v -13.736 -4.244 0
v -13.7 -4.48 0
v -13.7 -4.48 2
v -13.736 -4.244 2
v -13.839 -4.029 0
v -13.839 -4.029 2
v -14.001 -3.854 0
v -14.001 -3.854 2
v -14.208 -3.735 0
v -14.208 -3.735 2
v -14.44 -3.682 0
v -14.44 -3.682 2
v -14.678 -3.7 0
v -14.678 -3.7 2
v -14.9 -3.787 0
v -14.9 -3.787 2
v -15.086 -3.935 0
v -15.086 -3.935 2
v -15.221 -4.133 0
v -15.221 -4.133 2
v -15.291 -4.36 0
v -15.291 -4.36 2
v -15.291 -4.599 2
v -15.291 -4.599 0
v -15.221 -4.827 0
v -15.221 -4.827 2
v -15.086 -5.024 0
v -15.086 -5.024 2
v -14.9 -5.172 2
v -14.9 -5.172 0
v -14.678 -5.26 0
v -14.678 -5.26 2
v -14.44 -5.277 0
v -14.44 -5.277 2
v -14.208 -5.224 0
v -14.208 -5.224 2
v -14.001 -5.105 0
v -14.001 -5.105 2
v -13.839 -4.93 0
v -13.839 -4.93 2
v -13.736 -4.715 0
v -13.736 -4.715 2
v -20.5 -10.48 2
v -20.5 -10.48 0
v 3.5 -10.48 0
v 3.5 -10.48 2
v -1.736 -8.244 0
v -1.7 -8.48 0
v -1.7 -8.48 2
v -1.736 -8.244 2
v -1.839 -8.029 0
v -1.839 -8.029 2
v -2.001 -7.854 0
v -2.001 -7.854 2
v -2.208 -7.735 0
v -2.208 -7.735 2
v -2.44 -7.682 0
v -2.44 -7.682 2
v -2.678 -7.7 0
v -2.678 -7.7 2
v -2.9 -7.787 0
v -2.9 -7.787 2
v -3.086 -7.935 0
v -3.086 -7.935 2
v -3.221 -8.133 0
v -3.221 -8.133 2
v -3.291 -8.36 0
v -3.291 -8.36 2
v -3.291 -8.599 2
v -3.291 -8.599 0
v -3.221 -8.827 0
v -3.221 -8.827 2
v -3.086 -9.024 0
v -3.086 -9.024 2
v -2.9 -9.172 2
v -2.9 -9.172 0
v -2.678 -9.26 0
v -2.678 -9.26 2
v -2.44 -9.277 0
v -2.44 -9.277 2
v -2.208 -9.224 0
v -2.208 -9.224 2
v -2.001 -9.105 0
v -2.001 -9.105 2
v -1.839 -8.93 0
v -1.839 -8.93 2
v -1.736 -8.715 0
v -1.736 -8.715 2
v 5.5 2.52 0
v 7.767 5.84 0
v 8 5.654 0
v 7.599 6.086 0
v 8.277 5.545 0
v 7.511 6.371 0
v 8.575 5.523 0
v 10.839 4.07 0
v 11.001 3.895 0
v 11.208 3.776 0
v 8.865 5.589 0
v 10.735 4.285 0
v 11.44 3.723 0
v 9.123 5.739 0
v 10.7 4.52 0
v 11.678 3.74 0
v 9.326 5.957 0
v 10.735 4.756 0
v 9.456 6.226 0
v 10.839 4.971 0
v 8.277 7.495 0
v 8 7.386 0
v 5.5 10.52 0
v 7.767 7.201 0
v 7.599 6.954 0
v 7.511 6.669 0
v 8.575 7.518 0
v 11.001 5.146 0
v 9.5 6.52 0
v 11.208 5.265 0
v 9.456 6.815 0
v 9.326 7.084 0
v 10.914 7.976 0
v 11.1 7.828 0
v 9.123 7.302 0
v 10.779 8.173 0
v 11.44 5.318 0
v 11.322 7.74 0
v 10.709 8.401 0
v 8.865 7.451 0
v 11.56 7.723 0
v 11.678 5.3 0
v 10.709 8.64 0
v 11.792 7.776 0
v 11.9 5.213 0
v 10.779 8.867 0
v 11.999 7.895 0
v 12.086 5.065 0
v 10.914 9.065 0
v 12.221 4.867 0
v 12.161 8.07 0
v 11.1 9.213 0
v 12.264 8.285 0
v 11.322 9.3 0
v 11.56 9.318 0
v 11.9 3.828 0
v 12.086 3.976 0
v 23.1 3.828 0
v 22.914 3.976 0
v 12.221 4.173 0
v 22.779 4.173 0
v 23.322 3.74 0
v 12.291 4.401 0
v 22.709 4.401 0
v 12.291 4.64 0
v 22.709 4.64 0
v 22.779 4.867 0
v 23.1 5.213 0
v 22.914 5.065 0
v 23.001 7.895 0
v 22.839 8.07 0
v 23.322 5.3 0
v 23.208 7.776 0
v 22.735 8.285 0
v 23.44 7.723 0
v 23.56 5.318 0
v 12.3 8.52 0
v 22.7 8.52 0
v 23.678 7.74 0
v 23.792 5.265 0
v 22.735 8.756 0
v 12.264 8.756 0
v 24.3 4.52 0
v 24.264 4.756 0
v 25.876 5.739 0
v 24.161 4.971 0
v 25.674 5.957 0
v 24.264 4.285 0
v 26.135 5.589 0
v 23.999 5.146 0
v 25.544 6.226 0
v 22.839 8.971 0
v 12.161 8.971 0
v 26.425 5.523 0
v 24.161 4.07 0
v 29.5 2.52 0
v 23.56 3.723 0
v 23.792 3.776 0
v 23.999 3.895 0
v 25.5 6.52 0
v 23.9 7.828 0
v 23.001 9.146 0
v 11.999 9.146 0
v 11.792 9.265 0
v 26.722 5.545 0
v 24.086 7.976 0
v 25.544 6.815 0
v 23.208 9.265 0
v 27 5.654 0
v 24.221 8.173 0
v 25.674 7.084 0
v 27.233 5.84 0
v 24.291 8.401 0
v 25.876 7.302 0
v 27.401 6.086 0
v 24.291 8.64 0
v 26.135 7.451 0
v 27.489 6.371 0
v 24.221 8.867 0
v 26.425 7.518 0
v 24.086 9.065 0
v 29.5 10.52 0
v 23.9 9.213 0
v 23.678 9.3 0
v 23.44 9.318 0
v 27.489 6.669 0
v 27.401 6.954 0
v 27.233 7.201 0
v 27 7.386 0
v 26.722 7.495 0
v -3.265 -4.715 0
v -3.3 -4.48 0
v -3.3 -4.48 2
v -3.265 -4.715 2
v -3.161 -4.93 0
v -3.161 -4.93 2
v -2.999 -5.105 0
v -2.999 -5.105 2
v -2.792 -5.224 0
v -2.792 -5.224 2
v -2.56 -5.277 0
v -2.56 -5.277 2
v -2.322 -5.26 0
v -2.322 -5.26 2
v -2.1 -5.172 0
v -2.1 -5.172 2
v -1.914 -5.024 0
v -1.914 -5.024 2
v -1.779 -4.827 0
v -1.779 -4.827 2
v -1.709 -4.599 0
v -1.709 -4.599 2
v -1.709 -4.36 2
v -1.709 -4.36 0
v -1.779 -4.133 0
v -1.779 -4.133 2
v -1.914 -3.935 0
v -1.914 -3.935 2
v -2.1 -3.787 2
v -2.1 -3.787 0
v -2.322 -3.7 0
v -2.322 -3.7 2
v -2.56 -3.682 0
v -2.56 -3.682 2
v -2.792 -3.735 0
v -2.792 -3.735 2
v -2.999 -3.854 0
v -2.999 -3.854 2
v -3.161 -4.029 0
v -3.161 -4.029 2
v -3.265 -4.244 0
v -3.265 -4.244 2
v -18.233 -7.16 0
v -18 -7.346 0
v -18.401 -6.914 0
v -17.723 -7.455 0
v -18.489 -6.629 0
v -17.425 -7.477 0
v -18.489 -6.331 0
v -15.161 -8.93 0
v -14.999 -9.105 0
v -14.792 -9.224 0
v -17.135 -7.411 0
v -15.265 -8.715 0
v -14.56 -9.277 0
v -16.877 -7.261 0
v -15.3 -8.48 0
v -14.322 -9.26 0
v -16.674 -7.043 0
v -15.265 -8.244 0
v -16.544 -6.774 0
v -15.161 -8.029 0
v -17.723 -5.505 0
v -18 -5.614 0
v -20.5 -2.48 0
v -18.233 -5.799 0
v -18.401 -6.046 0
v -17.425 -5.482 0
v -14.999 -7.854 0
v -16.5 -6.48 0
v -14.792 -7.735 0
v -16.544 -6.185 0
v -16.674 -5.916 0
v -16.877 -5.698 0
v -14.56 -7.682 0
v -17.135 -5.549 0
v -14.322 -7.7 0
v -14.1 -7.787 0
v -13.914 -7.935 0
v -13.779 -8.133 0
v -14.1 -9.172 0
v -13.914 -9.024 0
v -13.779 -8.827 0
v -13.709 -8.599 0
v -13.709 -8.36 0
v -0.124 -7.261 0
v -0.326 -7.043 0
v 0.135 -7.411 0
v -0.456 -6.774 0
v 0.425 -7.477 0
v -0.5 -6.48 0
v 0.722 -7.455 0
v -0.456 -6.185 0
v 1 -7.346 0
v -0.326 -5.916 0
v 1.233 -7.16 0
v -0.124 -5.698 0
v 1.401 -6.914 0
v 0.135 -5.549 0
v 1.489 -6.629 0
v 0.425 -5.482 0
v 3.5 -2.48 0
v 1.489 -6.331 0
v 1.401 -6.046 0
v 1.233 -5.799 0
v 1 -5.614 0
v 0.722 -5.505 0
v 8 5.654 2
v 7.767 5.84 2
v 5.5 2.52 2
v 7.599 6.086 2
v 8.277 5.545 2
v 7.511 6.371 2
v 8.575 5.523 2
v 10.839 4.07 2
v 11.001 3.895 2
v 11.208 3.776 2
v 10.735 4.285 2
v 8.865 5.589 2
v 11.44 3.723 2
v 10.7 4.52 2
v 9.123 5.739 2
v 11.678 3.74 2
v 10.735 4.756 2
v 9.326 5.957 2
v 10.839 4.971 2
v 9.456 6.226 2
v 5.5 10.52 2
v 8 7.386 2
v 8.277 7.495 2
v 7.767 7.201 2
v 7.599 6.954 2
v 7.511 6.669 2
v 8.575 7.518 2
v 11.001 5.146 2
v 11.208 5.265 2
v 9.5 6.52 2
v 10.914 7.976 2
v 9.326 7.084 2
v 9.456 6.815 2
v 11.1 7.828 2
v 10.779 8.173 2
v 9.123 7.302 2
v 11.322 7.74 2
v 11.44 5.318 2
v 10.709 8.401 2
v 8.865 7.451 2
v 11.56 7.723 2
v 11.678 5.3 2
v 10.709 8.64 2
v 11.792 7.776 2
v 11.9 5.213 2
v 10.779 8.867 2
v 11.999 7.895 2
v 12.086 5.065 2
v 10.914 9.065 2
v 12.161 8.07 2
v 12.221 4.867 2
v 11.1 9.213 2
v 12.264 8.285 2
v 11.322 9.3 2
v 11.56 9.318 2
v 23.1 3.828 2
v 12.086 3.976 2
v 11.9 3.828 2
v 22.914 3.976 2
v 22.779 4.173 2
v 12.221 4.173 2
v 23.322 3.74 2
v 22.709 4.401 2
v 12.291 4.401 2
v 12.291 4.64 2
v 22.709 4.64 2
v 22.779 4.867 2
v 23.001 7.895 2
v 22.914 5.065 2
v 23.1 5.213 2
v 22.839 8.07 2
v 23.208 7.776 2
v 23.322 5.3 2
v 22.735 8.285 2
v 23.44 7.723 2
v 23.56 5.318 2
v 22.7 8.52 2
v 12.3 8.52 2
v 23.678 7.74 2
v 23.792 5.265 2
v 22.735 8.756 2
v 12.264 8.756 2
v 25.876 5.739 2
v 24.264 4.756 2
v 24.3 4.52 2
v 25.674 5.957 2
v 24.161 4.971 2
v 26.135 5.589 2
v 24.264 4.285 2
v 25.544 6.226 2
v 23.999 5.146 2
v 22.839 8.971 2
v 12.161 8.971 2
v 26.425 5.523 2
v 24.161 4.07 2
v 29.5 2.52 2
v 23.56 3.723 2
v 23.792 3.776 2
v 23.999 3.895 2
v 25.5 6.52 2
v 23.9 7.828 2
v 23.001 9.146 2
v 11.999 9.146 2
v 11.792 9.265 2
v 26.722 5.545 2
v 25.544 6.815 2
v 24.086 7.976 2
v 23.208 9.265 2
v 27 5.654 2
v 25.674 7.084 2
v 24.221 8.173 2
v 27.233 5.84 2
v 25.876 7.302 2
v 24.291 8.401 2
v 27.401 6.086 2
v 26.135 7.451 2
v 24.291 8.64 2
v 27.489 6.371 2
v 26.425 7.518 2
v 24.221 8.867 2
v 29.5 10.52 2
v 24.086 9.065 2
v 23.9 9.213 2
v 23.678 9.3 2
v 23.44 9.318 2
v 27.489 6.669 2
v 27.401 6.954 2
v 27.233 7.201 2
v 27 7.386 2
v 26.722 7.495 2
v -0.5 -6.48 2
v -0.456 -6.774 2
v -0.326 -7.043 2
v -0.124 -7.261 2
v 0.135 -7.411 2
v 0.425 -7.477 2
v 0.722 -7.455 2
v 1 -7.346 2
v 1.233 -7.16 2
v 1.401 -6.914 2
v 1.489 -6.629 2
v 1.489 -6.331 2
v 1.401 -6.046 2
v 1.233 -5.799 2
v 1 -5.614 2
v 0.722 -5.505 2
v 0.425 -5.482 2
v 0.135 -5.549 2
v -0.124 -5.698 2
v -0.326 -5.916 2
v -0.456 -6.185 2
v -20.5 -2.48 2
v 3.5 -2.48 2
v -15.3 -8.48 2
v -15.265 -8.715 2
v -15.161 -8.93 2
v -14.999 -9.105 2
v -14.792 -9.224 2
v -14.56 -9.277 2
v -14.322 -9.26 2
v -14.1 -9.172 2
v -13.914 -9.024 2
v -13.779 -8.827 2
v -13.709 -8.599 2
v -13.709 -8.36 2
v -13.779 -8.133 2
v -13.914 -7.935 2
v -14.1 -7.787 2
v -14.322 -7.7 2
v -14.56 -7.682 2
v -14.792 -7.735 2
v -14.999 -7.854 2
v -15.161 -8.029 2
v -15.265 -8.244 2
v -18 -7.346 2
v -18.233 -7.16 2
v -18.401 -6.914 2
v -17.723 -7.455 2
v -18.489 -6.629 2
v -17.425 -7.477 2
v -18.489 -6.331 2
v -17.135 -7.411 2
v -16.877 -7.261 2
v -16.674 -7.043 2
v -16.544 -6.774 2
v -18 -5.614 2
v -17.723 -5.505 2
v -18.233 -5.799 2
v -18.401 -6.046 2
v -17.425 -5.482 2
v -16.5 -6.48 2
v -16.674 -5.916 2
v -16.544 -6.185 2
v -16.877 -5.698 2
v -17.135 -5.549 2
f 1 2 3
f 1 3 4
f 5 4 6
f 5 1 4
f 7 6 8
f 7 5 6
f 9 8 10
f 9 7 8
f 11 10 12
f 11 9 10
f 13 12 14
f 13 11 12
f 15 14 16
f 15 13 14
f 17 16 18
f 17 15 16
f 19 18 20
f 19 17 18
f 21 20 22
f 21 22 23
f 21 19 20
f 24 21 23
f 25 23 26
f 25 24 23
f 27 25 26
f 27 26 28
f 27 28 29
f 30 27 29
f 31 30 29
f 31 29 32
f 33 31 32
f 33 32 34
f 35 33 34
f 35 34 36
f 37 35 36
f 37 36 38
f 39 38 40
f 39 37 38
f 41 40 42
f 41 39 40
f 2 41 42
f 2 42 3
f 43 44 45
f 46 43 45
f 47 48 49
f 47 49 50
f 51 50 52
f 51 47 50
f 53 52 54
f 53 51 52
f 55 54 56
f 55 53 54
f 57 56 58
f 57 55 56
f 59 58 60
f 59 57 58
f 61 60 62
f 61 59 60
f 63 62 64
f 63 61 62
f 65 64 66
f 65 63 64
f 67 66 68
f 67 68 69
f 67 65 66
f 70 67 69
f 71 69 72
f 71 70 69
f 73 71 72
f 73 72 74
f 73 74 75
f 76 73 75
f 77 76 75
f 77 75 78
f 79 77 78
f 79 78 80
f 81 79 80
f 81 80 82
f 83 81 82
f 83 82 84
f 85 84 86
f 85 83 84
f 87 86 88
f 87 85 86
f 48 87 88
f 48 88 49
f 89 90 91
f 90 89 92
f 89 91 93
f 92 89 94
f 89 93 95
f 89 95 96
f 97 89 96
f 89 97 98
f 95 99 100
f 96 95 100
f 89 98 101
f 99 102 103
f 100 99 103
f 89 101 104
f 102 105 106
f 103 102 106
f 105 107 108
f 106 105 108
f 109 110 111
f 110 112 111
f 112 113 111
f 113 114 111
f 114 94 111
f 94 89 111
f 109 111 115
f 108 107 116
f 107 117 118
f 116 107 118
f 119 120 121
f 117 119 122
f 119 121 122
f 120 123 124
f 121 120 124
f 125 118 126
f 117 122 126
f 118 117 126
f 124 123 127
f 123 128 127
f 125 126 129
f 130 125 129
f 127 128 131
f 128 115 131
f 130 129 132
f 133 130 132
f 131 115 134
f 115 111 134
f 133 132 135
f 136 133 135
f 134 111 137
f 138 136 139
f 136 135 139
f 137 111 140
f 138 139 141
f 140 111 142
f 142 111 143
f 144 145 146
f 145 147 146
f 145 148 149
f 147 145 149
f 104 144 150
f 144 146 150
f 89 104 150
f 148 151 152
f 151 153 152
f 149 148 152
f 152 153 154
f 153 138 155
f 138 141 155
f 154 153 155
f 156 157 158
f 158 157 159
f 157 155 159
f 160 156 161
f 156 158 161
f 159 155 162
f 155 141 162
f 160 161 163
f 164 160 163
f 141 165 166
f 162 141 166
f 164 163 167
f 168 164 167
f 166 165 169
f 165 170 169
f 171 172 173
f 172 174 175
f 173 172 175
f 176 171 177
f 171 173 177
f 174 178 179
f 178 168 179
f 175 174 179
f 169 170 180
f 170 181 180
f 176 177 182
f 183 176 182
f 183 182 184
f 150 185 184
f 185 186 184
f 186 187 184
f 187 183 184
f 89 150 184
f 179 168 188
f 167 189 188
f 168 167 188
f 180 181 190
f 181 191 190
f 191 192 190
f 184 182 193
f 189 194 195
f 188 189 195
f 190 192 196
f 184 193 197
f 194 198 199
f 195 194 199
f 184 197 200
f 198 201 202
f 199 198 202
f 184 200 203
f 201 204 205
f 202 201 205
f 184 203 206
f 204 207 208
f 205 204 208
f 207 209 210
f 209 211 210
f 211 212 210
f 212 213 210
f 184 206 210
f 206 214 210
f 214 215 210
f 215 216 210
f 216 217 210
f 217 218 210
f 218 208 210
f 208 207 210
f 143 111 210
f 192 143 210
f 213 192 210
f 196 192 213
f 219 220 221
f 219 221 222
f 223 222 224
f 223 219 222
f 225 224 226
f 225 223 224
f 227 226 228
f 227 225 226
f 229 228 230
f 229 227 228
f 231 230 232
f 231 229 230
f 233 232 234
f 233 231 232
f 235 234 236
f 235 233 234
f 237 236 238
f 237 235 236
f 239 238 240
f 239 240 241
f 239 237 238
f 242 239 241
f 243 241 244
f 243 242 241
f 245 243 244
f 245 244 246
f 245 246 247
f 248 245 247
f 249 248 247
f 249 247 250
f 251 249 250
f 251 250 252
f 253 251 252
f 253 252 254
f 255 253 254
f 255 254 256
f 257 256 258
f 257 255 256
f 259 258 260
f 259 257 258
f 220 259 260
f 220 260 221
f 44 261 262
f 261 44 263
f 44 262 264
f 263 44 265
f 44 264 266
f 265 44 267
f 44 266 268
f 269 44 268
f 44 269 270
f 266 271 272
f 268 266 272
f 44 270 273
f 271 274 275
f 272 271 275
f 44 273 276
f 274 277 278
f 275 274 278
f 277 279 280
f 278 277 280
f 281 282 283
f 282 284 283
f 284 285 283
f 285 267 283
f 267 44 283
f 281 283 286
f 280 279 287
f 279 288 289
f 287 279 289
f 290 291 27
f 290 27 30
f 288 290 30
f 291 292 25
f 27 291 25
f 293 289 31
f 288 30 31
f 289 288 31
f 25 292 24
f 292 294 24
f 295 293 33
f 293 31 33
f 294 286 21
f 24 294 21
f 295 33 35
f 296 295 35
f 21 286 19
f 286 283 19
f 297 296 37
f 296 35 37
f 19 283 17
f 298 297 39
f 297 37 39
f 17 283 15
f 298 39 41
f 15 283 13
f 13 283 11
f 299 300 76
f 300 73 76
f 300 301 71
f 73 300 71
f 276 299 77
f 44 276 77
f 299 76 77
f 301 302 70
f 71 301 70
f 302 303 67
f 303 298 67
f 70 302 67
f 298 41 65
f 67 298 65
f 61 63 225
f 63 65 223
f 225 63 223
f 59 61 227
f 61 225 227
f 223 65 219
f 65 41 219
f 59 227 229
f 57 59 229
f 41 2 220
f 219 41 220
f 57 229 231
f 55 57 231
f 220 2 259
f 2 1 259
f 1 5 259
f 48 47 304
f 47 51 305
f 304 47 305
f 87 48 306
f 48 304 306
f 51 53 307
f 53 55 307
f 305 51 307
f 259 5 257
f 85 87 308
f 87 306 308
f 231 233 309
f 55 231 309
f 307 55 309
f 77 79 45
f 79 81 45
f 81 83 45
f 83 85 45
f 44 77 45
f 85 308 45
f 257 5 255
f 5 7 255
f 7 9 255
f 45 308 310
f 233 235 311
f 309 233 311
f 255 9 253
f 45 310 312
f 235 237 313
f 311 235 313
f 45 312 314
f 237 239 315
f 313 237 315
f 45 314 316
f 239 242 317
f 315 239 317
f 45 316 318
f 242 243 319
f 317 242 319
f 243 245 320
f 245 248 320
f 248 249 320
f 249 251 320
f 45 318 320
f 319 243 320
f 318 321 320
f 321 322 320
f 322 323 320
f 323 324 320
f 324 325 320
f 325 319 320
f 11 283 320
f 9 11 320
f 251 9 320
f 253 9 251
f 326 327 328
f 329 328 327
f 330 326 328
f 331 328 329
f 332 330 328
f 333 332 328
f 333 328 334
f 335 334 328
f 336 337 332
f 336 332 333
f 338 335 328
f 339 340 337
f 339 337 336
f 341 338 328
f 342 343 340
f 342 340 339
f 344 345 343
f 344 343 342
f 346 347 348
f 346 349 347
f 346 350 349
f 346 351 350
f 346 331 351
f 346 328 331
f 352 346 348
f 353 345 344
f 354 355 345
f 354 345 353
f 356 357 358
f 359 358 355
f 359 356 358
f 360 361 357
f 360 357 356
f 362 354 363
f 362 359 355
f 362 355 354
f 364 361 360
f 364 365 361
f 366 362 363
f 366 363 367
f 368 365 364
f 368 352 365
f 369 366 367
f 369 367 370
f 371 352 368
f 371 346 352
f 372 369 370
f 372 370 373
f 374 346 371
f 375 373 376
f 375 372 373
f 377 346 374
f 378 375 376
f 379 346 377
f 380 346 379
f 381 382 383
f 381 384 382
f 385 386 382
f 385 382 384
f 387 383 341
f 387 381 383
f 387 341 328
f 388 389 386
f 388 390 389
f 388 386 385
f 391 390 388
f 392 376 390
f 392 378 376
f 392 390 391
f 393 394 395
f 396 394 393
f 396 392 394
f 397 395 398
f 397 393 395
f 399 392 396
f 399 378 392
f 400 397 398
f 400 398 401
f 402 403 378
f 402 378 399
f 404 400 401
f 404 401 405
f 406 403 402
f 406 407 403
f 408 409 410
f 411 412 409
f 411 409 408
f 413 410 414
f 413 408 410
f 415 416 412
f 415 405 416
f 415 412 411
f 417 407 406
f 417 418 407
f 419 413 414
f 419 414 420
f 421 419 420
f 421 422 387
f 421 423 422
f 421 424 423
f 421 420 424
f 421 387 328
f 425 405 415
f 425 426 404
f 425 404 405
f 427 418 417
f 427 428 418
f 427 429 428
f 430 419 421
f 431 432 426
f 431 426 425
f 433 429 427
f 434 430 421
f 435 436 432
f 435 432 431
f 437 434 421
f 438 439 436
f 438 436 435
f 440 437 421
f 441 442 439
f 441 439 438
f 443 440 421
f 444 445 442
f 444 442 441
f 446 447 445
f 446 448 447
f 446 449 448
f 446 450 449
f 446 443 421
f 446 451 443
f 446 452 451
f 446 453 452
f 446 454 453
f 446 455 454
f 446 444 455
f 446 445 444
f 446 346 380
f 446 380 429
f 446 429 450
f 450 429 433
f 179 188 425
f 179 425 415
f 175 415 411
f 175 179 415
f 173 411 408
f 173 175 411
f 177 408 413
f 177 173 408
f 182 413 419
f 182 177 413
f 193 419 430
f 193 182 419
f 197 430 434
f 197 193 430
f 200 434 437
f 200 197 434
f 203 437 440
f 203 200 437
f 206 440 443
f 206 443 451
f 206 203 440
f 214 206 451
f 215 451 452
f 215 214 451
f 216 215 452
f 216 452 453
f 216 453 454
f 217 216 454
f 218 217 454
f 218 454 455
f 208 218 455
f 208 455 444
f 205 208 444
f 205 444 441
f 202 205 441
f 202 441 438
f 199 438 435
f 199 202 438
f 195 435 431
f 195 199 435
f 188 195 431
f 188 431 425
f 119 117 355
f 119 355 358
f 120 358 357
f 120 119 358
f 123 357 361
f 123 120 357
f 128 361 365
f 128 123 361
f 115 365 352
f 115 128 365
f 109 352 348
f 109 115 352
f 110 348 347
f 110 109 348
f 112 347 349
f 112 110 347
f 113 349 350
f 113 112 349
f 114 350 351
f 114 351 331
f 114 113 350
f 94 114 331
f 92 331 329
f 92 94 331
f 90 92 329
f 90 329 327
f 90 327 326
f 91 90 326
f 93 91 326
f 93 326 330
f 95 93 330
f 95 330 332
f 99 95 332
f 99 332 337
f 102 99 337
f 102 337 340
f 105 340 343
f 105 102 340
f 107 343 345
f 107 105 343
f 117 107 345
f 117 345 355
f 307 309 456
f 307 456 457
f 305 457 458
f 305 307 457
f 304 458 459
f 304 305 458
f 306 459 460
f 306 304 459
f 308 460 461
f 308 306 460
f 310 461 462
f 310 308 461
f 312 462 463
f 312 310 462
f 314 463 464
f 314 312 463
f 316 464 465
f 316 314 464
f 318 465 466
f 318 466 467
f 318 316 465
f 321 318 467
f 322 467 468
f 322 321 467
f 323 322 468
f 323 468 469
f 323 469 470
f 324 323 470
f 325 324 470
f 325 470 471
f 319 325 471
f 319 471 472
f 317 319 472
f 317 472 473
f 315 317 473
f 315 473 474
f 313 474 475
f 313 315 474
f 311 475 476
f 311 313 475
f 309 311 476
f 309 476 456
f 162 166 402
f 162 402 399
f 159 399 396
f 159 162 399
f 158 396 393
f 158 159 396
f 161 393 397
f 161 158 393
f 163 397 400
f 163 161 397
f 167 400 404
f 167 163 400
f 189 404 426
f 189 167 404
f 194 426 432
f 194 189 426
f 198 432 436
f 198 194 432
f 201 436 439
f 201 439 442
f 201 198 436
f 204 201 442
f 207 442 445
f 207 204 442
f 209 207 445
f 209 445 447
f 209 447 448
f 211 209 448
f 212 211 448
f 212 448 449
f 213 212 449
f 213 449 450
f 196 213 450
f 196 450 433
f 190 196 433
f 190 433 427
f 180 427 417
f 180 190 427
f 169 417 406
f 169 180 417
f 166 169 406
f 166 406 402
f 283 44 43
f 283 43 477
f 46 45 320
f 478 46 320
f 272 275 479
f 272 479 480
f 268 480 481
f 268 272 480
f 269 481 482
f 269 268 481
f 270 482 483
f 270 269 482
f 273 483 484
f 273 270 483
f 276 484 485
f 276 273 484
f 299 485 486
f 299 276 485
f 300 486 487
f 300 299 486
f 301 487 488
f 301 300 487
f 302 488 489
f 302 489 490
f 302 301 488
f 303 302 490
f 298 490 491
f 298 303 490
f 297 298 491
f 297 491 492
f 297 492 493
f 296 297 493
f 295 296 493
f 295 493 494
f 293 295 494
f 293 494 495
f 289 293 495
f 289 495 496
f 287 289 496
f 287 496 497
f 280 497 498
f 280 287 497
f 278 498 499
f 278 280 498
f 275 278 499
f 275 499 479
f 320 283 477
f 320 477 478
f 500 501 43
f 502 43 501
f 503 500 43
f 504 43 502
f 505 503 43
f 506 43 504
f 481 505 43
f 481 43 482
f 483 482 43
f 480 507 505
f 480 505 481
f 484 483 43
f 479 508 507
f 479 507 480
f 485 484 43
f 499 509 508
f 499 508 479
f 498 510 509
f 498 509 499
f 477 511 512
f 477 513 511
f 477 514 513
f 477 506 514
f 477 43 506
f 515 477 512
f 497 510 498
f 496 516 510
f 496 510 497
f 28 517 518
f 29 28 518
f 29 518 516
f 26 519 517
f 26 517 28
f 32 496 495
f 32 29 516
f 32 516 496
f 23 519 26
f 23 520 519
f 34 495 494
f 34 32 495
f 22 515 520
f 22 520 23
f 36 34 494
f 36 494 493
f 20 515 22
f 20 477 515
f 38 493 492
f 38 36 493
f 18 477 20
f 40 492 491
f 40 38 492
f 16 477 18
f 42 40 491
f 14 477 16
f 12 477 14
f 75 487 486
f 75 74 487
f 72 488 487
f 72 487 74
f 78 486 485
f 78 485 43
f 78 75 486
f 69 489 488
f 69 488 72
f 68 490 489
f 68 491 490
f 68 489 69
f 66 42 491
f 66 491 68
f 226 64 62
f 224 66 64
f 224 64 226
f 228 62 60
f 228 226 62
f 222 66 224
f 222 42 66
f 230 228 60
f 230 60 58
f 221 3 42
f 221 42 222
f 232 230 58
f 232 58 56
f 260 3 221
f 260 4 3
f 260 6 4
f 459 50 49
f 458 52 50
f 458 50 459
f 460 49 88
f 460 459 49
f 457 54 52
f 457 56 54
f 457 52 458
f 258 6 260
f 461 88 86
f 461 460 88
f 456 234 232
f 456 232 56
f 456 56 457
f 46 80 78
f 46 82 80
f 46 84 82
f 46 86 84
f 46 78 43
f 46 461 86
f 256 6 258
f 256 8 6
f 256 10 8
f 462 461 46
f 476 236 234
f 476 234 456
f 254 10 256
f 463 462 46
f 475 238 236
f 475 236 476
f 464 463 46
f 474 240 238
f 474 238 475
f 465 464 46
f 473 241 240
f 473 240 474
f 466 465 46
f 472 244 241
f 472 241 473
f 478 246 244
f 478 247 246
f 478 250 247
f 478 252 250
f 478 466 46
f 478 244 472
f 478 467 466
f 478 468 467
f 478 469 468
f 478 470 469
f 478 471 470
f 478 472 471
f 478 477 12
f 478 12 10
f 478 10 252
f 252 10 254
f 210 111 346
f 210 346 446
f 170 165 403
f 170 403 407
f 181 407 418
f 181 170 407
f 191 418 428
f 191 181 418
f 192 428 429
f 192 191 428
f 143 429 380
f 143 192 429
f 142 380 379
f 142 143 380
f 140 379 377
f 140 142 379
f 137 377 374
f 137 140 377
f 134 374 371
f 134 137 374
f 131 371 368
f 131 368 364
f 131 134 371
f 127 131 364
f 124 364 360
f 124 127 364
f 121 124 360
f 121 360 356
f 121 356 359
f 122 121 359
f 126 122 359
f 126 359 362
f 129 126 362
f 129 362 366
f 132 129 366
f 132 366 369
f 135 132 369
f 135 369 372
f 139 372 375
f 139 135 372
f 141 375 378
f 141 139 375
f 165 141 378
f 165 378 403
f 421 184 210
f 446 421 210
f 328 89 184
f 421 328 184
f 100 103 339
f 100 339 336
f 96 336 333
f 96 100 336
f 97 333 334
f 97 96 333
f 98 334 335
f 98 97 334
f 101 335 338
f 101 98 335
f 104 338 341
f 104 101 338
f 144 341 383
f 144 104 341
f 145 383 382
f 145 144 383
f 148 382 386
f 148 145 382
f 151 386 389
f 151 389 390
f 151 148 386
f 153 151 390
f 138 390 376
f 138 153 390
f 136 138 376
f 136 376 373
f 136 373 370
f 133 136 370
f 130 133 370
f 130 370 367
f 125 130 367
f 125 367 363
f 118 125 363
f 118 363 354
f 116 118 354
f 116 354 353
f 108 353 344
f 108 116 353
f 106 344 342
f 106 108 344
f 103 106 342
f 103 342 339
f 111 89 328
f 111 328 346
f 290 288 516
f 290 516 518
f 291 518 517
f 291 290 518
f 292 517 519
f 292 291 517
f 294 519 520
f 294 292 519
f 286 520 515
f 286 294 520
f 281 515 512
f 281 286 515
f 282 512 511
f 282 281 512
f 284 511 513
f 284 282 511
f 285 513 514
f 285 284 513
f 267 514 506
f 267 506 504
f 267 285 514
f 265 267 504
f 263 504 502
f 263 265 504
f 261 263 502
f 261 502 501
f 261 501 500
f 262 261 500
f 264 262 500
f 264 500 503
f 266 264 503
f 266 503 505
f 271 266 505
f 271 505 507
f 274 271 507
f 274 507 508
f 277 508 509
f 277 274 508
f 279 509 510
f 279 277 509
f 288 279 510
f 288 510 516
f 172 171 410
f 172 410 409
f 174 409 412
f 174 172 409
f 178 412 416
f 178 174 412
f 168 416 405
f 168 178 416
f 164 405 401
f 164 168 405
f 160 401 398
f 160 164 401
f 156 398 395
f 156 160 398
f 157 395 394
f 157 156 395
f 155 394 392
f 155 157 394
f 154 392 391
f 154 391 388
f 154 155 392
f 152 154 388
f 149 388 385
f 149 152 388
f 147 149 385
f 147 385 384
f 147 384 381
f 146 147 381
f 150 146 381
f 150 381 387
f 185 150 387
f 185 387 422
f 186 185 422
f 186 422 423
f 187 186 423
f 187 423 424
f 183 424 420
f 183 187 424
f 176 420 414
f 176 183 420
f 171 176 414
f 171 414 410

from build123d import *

# Parameters (mm, degrees)
SKETCH1_W             = 24
SKETCH1_H             = 8
SKETCH1_R             = 1
SKETCH1_R_2           = 0.8
BOSS_EXTRUDE1_DEPTH   = 2
BOSS_EXTRUDE1_2_DEPTH = 2


with BuildPart() as part:
    # Sketch1 → Boss-Extrude1 (new body)
    with BuildSketch(Plane.XY):
        with Locations((-8.500045519, -6.479626746)):
            Rectangle(SKETCH1_W, SKETCH1_H)
        with Locations(Location((0.499954481, -6.479626746, 0), (0, 0, 180))):
            Circle(SKETCH1_R, mode=Mode.SUBTRACT)
        with Locations((-14.500045519, -4.479626746)):
            Circle(SKETCH1_R_2, mode=Mode.SUBTRACT)
        with Locations((-2.500045519, -8.479626746)):
            Circle(SKETCH1_R_2, mode=Mode.SUBTRACT)
        with Locations(Location((-2.500045519, -4.479626746, 0), (0, 0, 180))):
            Circle(SKETCH1_R_2, mode=Mode.SUBTRACT)
        with Locations((-17.500045519, -6.479626746)):
            Circle(SKETCH1_R, mode=Mode.SUBTRACT)
        with Locations(Location((-14.500045519, -8.479626746, 0), (0, 0, 180))):
            Circle(SKETCH1_R_2, mode=Mode.SUBTRACT)
    extrude(amount=BOSS_EXTRUDE1_DEPTH)


with BuildPart() as body_2:
    # Sketch1 → Boss-Extrude1 2 (new body)
    with BuildSketch(Plane.XY):
        with Locations((17.499954481, 6.520373254)):
            Rectangle(SKETCH1_W, SKETCH1_H)
        with Locations((11.499954481, 8.520373254)):
            Circle(SKETCH1_R_2, mode=Mode.SUBTRACT)
        with Locations((8.499954481, 6.520373254)):
            Circle(SKETCH1_R, mode=Mode.SUBTRACT)
        with Locations(Location((11.499954481, 4.520373254, 0), (0, 0, 180))):
            Circle(SKETCH1_R_2, mode=Mode.SUBTRACT)
        with Locations((23.499954481, 4.520373254)):
            Circle(SKETCH1_R_2, mode=Mode.SUBTRACT)
        with Locations(Location((26.499954481, 6.520373254, 0), (0, 0, 180))):
            Circle(SKETCH1_R, mode=Mode.SUBTRACT)
        with Locations(Location((23.499954481, 8.520373254, 0), (0, 0, 180))):
            Circle(SKETCH1_R_2, mode=Mode.SUBTRACT)
    extrude(amount=BOSS_EXTRUDE1_2_DEPTH)


solid = Compound([part.part, body_2.part])
